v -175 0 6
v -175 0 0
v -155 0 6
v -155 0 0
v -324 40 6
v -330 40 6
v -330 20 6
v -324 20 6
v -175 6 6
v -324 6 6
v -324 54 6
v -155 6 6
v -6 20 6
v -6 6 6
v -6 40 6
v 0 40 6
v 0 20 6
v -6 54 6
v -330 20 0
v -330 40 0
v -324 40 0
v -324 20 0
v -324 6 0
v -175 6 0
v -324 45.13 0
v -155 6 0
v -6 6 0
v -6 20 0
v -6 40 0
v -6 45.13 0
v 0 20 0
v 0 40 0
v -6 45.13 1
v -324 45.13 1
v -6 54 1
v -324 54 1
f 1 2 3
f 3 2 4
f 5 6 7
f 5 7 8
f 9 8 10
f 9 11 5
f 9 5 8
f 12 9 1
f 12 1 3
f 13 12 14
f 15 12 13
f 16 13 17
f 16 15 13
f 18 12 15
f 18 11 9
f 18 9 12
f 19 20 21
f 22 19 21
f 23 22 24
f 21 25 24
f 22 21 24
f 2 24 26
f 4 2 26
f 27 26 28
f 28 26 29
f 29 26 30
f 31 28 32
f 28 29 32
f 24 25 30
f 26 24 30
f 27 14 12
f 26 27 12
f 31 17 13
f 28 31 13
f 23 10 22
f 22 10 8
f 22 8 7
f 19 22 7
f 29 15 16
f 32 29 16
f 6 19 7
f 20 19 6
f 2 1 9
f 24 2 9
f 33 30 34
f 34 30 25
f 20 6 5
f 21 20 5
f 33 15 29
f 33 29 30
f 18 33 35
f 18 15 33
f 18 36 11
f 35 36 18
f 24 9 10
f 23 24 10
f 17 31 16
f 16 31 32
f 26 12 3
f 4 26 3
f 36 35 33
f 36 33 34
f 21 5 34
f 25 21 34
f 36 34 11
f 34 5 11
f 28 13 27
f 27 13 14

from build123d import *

# Parameters (mm, degrees)
ESQUISSE1_W             = 330
ESQUISSE1_H             = 54
BOSS_EXTRU_1_DEPTH      = 6
ESQUISSE2_W             = 6
ESQUISSE2_H             = 14
ENL_V_MAT_EXTRU_1_DEPTH = 335.442820225
ESQUISSE4_W             = 318
ESQUISSE4_H             = 8.870374263
ENL_V_MAT_EXTRU_2_DEPTH = 1


with BuildPart() as part:
    # Esquisse1 → Boss.-Extru.1 (new body)
    with BuildSketch(Plane.XY):
        with Locations((-165, 27)):
            Rectangle(ESQUISSE1_W, ESQUISSE1_H)
    extrude(amount=BOSS_EXTRU_1_DEPTH)

    # Esquisse2 → Enlèv. mat.-Extru.1 (cut, through all)
    with BuildSketch(Plane.XY.offset(6)):
        Polygon((-330, 0), (-175, 0), (-175, 6), (-324, 6), (-324, 20), (-330, 20), align=None)
        with Locations((-327, 47)):
            Rectangle(ESQUISSE2_W, ESQUISSE2_H)
        Polygon((-155, 0), (0, 0), (0, 20), (-6, 20), (-6, 6), (-155, 6), align=None)
        with Locations((-3, 47)):
            Rectangle(ESQUISSE2_W, ESQUISSE2_H)
    extrude(amount=-ENL_V_MAT_EXTRU_1_DEPTH, mode=Mode.SUBTRACT)

    # Esquisse4 → Enlèv. mat.-Extru.2 (cut)
    with BuildSketch(Plane(origin=(0, 0, 0), x_dir=(-1, 0, 0), z_dir=(0, 0, -1))):
        with Locations((165, 49.564812868)):
            Rectangle(ESQUISSE4_W, ESQUISSE4_H)
    extrude(amount=-ENL_V_MAT_EXTRU_2_DEPTH, mode=Mode.SUBTRACT)


solid = part.part
